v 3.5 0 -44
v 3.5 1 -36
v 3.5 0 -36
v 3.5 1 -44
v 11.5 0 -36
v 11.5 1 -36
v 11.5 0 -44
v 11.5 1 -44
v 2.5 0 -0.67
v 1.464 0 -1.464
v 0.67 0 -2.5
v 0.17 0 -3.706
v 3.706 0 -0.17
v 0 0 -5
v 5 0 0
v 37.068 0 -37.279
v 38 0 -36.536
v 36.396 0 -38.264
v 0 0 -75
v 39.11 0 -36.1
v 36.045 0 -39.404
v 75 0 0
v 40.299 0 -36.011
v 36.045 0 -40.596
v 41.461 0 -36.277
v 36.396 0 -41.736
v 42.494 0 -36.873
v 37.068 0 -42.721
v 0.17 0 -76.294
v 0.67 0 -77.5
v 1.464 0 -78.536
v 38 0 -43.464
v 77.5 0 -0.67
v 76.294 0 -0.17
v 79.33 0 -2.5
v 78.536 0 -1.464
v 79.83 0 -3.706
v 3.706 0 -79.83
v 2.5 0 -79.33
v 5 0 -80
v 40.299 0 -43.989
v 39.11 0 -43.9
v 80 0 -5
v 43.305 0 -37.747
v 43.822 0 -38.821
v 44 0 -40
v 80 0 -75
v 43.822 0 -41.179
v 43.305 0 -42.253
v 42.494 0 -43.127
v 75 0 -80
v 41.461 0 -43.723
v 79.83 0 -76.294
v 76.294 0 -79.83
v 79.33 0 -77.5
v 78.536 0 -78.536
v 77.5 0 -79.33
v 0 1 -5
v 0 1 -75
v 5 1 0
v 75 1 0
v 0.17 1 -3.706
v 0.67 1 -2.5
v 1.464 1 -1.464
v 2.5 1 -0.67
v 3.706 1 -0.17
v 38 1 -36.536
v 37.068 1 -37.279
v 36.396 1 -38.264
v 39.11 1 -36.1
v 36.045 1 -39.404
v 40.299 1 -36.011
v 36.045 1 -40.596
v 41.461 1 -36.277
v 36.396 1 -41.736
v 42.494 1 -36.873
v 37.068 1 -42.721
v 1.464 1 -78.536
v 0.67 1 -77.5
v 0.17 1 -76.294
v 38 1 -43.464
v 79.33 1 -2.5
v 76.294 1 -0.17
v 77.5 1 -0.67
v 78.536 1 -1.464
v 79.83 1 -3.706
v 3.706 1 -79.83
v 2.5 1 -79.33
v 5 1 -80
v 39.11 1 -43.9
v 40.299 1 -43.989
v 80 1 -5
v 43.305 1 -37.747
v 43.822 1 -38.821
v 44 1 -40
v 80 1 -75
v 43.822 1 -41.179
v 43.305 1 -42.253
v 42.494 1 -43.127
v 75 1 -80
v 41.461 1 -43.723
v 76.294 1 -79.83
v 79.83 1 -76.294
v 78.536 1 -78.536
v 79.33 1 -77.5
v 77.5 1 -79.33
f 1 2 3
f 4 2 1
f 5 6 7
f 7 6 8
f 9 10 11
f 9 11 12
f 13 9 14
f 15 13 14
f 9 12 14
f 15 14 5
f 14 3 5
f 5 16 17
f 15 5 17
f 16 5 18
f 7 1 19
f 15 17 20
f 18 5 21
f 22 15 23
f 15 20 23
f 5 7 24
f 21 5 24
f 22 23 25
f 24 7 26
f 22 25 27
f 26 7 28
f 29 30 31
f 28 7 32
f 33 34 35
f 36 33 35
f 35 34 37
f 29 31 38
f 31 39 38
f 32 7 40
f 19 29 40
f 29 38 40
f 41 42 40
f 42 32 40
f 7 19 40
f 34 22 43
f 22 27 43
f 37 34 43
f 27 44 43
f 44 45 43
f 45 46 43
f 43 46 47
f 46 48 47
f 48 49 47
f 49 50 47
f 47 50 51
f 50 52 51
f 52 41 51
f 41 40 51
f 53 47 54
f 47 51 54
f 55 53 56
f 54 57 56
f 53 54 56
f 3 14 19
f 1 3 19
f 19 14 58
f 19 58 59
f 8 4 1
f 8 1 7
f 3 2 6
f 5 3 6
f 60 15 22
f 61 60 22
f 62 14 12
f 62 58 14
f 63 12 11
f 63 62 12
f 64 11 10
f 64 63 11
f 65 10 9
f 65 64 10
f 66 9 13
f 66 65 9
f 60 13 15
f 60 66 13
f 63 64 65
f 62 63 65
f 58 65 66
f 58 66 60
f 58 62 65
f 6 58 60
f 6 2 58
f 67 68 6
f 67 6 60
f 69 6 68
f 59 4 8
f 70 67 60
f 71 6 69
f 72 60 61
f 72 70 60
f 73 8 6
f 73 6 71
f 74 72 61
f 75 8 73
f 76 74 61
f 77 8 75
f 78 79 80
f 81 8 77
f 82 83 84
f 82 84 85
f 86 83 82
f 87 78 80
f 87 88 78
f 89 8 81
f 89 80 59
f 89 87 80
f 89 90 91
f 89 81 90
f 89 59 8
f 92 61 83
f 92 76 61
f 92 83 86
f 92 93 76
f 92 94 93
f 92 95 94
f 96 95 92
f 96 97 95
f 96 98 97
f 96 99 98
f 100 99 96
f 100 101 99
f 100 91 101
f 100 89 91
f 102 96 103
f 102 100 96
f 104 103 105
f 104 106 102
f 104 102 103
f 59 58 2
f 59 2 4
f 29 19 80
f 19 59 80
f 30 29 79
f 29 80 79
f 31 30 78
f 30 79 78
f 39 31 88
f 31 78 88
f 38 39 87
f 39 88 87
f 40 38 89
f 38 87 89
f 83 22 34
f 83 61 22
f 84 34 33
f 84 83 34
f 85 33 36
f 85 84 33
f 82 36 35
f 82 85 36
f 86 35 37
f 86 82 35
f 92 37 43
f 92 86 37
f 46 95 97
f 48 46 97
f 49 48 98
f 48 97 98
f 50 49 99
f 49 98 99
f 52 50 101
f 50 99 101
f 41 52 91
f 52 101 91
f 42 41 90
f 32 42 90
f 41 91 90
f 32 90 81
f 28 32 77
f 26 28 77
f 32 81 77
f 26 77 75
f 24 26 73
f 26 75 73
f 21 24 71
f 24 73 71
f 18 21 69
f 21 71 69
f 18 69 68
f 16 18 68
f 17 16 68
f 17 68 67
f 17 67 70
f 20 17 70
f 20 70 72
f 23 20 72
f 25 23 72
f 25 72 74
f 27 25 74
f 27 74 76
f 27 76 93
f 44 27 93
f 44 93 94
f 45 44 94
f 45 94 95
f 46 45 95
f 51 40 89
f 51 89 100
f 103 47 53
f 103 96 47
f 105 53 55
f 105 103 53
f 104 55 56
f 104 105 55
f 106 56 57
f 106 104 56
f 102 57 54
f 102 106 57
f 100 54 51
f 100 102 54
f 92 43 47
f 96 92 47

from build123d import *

# Parameters (mm, degrees)
ESQUISSE1_W             = 80
ESQUISSE1_H             = 80
EXTRUSION1_DEPTH        = 1
CONG_1_R                = 5
ESQUISSE3_R             = 4
ENL_V_MAT_EXTRU_1_DEPTH = 2
ESQUISSE4_W             = 8
ESQUISSE4_H             = 8
ENL_V_MAT_EXTRU_2_DEPTH = 2


with BuildPart() as part:
    # Esquisse1 → Extrusion1 (new body)
    with BuildSketch(Plane(origin=(0, 0, 0), x_dir=(1, 0, 0), z_dir=(0, 1, 0))):
        with Locations((40, 40)):
            Rectangle(ESQUISSE1_W, ESQUISSE1_H)
    extrude(amount=EXTRUSION1_DEPTH)

    # Congé1
    cong_1_edges = [part.edges().sort_by_distance(p)[0] for p in [
        (0, 0.5, -80),
        (80, 0.5, -80),
        (80, 0.5, 0),
        (0, 0.5, 0),
    ]]
    fillet(cong_1_edges, radius=CONG_1_R)

    # Esquisse3 → Enlèv. mat.-Extru.1 (cut, through all)
    with BuildSketch(Plane(origin=(0, 1, 0), x_dir=(1, 0, 0), z_dir=(0, 1, 0))):
        with Locations((40, 40)):
            Circle(ESQUISSE3_R)
    extrude(amount=-ENL_V_MAT_EXTRU_1_DEPTH, mode=Mode.SUBTRACT)

    # Esquisse4 → Enlèv. mat.-Extru.2 (cut, through all)
    with BuildSketch(Plane(origin=(0, 1, 0), x_dir=(1, 0, 0), z_dir=(0, 1, 0))):
        with Locations((7.5, 40)):
            Rectangle(ESQUISSE4_W, ESQUISSE4_H)
    extrude(amount=-ENL_V_MAT_EXTRU_2_DEPTH, mode=Mode.SUBTRACT)


solid = part.part
